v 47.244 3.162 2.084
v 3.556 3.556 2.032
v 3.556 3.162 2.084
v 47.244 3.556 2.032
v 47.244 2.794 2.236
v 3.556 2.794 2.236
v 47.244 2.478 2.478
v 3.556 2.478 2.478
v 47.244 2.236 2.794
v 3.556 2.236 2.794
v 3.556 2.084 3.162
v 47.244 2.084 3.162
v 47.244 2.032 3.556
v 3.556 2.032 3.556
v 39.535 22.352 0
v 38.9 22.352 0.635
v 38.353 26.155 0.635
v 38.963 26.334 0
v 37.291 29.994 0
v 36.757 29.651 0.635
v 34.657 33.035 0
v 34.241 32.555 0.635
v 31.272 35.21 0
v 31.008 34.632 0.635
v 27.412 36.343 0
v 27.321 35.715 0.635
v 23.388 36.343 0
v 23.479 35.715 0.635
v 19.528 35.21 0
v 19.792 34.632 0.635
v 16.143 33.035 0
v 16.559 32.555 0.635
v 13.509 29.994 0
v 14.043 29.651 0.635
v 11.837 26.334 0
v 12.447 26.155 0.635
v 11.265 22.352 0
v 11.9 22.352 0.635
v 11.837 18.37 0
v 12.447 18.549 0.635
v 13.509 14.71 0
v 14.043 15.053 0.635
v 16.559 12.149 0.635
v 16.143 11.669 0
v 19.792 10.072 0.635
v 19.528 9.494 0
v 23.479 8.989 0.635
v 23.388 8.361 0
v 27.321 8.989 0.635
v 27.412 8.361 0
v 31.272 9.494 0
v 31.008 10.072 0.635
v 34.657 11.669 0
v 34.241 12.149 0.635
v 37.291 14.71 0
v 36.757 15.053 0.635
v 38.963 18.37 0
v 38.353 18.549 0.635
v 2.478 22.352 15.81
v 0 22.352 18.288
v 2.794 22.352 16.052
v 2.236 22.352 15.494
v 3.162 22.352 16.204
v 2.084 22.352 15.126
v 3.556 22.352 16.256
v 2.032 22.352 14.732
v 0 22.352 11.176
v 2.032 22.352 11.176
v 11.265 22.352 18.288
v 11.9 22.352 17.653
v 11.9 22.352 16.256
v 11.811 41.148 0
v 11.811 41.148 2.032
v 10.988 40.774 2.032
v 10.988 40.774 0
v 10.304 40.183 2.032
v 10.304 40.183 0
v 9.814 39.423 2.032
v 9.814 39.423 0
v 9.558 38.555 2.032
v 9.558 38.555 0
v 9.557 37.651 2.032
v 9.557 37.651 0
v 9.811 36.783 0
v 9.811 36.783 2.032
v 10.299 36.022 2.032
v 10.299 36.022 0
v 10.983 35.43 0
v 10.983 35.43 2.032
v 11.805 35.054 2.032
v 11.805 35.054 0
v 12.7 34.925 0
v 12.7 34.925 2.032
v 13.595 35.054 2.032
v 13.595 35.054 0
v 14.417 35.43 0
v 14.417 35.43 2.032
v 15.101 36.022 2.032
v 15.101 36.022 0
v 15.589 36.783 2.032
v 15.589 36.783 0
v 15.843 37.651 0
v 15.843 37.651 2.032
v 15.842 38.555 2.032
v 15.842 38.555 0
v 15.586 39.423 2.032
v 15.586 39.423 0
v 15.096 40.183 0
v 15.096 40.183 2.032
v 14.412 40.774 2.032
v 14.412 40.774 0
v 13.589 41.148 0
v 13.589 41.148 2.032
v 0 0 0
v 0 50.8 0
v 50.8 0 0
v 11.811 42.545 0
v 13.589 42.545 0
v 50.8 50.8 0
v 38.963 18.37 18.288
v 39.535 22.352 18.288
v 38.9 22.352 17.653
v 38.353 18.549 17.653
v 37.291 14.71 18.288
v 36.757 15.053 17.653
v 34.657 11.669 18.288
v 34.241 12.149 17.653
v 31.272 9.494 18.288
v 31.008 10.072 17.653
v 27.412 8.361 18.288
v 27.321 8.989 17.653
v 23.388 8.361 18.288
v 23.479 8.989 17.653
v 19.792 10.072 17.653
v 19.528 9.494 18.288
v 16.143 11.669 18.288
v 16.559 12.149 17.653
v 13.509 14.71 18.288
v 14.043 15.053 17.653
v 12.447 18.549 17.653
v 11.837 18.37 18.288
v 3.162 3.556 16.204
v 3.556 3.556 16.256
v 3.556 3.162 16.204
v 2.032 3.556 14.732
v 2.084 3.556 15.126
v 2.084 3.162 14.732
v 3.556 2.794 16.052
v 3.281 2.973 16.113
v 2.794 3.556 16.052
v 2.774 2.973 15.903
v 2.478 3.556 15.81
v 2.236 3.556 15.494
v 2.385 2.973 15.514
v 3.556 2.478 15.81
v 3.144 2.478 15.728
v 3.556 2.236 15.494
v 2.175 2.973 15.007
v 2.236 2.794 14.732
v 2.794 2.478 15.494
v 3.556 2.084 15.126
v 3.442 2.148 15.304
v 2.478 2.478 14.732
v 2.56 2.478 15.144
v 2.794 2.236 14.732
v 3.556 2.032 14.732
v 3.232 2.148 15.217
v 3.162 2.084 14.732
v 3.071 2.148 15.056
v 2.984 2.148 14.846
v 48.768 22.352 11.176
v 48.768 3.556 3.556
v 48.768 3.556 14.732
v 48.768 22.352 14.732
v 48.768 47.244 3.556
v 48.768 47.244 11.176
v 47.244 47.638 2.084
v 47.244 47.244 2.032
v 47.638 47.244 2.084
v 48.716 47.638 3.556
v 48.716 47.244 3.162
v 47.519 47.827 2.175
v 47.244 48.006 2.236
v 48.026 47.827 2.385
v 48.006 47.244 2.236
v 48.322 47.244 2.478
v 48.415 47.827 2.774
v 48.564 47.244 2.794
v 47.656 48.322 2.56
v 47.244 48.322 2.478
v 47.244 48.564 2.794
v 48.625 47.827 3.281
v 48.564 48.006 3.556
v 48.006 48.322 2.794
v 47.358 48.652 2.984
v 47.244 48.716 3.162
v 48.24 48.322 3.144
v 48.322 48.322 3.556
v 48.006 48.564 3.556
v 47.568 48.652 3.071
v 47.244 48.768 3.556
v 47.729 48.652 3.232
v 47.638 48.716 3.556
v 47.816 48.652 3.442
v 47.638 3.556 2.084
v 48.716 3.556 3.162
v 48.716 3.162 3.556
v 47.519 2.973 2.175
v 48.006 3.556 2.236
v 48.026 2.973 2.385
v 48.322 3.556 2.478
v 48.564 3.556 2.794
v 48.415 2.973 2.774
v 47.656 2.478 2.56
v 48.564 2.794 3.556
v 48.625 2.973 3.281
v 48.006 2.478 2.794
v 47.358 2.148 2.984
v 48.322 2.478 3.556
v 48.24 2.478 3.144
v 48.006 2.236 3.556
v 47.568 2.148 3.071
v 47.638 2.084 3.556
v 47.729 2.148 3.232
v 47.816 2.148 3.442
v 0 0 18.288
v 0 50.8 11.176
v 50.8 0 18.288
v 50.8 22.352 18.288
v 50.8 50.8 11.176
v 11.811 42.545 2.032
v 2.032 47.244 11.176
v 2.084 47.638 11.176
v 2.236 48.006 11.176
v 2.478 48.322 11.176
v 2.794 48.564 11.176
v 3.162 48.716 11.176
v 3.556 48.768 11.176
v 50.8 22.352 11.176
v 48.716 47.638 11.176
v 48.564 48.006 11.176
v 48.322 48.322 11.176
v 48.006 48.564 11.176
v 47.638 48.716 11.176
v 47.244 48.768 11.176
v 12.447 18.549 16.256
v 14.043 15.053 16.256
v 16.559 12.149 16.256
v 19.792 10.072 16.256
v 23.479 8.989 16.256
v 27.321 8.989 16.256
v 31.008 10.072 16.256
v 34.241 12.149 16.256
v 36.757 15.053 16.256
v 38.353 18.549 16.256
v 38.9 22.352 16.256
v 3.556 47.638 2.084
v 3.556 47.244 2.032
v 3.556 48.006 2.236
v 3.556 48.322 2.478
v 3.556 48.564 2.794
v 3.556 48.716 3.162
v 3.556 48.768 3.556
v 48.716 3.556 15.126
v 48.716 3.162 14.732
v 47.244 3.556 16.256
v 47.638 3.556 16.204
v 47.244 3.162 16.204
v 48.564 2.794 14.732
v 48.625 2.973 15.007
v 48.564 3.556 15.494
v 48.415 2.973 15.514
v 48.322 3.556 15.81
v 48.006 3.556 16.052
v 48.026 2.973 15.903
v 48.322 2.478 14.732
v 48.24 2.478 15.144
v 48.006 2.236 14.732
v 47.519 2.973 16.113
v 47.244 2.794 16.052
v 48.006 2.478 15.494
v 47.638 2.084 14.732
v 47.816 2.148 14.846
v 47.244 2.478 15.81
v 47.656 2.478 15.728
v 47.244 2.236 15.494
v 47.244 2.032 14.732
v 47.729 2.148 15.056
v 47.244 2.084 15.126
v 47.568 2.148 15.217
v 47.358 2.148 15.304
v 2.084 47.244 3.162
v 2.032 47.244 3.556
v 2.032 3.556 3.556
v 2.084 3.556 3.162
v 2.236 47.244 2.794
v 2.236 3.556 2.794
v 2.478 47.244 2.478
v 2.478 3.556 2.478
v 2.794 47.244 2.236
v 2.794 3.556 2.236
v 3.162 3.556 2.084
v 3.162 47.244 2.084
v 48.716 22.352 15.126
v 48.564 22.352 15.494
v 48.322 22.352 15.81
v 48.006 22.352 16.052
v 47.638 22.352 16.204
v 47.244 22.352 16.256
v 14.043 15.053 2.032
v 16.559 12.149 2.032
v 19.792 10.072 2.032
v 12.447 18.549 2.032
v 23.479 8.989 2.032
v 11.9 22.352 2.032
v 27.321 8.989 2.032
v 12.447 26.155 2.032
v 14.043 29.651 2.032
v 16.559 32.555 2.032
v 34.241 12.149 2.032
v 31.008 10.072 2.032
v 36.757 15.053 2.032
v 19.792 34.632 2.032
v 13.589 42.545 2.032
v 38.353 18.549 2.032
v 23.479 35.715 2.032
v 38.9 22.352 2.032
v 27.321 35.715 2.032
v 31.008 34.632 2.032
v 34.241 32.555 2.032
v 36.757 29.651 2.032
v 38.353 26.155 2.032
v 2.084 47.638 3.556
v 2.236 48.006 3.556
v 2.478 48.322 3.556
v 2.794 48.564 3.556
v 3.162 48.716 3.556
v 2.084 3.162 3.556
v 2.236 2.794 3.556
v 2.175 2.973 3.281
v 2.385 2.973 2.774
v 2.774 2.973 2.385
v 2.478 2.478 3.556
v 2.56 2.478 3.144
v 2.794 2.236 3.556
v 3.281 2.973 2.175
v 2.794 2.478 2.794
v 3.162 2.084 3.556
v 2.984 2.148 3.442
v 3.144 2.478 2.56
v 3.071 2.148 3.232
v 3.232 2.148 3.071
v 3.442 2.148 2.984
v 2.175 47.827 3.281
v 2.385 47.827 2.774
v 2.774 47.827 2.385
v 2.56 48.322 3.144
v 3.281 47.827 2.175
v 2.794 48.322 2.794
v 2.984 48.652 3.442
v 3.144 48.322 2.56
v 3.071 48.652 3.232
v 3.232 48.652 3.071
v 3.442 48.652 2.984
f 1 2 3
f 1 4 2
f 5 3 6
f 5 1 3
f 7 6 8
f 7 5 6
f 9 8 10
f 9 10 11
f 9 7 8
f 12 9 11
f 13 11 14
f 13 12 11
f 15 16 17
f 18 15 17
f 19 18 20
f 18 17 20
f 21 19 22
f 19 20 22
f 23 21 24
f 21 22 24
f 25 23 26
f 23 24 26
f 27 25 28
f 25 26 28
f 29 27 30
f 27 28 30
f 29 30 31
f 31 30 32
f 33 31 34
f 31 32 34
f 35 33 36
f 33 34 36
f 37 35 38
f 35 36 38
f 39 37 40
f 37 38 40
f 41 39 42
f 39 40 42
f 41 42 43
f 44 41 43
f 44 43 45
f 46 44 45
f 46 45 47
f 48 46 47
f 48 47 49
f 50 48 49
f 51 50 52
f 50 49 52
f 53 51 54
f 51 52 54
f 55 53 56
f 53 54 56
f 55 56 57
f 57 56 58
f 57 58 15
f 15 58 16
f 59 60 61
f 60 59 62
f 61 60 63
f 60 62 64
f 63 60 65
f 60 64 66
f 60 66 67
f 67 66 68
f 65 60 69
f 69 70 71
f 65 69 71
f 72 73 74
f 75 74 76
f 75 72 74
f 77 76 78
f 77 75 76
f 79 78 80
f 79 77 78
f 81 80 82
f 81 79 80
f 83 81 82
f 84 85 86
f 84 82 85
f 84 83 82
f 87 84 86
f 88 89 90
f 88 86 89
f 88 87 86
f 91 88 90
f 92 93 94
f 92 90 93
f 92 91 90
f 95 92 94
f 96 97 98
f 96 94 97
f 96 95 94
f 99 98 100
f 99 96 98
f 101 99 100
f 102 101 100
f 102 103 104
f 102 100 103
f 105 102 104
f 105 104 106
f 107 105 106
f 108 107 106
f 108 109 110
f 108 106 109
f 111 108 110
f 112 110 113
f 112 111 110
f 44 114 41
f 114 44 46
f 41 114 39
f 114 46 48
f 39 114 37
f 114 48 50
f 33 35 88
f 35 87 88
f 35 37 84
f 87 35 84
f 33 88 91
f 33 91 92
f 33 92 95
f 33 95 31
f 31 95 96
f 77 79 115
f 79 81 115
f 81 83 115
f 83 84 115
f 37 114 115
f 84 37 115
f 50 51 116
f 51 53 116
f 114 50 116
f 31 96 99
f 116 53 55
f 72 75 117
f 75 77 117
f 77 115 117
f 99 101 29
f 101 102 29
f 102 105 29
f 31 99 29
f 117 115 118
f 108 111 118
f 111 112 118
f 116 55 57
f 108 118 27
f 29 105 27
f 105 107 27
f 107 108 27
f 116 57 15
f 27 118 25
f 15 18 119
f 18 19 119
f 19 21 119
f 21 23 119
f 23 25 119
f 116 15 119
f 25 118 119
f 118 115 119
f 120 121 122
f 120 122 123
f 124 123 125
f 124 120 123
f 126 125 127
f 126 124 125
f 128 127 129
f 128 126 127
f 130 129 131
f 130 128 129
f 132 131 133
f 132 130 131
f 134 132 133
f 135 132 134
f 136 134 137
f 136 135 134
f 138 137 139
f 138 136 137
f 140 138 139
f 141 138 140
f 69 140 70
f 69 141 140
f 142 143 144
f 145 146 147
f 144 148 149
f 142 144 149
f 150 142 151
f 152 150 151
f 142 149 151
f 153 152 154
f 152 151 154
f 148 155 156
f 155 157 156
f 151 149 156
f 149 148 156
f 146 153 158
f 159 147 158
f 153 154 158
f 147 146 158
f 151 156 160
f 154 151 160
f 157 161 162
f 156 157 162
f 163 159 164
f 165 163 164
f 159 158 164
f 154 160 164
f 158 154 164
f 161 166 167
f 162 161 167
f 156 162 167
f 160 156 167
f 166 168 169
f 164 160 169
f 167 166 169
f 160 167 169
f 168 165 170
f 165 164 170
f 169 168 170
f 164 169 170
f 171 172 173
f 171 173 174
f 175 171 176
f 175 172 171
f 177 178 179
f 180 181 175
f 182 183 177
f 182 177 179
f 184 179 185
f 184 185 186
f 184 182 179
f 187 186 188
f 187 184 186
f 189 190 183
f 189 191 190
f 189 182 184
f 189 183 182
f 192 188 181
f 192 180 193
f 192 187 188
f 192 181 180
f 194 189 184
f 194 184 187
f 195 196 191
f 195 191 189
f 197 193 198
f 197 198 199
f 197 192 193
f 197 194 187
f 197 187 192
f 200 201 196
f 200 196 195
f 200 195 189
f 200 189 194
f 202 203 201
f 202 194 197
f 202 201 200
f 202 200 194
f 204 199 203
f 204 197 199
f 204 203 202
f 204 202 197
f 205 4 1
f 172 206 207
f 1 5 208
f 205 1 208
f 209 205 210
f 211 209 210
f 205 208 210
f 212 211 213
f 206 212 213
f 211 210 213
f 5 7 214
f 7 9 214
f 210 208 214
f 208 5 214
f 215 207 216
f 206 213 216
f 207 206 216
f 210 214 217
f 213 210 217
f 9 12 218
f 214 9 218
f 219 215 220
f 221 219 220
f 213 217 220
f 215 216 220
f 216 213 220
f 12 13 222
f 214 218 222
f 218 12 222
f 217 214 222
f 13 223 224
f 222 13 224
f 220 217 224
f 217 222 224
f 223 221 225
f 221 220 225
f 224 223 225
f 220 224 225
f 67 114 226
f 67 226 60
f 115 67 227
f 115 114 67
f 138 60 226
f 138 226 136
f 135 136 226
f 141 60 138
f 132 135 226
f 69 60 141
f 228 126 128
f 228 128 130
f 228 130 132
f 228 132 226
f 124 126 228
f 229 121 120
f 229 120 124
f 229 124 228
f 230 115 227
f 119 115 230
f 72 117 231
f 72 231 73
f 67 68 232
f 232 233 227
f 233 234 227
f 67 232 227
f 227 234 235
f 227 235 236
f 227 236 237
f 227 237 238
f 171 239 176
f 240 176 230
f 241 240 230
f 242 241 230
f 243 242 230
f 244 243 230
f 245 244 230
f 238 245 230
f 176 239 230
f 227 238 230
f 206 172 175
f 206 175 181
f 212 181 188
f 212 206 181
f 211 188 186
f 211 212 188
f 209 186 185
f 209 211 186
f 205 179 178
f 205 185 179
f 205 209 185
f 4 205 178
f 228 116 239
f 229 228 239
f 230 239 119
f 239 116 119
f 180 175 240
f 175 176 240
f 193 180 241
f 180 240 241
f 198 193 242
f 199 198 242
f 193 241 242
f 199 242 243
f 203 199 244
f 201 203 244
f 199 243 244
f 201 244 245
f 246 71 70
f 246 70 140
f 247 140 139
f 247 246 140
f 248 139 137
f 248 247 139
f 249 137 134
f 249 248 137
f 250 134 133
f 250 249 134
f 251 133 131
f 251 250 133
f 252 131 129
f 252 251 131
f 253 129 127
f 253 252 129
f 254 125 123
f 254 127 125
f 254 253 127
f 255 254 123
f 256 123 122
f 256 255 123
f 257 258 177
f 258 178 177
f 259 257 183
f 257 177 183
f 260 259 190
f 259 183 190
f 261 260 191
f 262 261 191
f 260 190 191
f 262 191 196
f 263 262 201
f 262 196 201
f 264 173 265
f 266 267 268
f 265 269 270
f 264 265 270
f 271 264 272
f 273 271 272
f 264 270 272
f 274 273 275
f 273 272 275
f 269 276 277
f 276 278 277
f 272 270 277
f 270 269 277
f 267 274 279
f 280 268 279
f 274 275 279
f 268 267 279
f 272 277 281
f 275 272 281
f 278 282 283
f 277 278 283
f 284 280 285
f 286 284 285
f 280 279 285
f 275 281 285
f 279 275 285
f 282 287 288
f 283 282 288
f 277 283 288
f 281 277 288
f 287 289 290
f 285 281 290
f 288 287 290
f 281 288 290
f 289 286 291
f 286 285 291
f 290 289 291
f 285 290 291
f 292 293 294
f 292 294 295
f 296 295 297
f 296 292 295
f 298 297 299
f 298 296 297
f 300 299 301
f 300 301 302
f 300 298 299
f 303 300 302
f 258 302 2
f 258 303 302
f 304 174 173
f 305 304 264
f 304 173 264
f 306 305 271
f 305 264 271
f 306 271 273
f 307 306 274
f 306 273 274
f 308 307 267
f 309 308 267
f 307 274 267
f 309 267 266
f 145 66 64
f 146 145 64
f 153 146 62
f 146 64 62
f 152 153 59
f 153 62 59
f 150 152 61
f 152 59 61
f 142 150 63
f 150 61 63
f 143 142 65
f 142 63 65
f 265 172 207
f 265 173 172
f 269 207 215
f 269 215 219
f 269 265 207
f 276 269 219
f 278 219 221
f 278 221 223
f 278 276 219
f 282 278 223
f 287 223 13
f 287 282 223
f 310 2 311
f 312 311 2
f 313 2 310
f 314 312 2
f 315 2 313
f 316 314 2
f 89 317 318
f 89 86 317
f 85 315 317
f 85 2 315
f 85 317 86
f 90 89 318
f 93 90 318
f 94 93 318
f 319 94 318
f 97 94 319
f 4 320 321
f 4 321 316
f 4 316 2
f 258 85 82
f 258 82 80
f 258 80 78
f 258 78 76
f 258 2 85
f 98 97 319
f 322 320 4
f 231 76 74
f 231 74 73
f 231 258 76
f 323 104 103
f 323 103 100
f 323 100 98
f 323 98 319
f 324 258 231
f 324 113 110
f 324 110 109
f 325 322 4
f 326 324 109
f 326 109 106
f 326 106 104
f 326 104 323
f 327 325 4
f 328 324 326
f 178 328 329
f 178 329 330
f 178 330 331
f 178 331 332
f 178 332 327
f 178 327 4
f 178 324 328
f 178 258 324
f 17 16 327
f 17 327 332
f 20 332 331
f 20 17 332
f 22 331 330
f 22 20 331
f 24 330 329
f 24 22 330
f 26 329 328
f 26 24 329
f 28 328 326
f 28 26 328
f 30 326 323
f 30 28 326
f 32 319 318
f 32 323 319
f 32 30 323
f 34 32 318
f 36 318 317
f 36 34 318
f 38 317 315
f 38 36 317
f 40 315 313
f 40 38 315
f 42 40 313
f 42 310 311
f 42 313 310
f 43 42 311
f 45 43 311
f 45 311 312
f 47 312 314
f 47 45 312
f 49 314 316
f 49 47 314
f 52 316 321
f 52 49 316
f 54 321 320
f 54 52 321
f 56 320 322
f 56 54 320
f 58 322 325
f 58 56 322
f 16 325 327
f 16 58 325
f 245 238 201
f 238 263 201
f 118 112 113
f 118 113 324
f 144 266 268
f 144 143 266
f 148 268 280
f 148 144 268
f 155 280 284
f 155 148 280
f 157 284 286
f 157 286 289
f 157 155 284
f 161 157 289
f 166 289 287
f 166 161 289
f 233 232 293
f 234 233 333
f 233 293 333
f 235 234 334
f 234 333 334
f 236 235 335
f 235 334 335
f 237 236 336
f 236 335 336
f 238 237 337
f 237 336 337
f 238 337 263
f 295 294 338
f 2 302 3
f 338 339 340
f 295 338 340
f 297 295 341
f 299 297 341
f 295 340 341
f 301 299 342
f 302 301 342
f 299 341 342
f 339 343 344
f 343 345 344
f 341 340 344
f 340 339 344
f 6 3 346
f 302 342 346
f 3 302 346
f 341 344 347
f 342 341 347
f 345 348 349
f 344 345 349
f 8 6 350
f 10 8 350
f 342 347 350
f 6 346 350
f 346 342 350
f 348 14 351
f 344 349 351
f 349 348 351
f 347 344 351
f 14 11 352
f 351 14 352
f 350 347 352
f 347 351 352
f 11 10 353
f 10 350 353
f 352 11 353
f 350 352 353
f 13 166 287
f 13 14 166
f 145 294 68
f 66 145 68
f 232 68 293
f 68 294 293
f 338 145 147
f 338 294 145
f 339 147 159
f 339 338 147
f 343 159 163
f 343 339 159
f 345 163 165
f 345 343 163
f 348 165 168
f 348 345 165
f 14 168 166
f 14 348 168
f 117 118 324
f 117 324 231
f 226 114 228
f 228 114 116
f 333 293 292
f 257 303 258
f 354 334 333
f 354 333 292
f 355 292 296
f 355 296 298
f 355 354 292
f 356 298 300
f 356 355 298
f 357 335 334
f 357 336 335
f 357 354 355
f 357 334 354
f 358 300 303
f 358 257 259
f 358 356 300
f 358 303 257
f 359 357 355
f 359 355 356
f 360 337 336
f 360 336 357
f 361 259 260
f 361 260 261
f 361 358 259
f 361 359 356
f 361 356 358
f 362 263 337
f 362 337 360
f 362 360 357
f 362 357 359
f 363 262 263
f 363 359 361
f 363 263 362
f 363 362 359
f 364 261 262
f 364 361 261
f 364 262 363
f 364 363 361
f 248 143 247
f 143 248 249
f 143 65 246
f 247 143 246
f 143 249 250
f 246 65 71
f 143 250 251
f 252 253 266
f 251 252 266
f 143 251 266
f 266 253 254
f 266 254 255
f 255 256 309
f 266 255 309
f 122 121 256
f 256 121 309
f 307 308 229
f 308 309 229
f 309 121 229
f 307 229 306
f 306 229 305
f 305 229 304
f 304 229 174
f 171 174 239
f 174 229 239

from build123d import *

# Parameters (mm, degrees)
SKETCH1_W          = 50.8
SKETCH1_H          = 50.8
MAIN_BODY_DEPTH    = 18.288
SKETCH2_W          = 7.112
SKETCH2_H          = 28.448
FRONT_CUT_DEPTH    = 75.133197314
SHELL1_T           = -2.032
SKETCH3_R          = 13.5001
CENTER_HOLE_DEPTH  = 75.133197314
FILL060_VERT_R     = 1.524
FILL060_TB_R       = 1.524
CHAM025_SIZE       = 0.635
KEYED_HOLE_1_DEPTH = 58.653742931


with BuildPart() as part:
    # Sketch1 → main body (new body)
    with BuildSketch(Plane.XY):
        with Locations((25.4, 25.4)):
            Rectangle(SKETCH1_W, SKETCH1_H)
    extrude(amount=MAIN_BODY_DEPTH)

    # Sketch2 → front cut (cut, through all)
    with BuildSketch(Plane(origin=(50.8, 0, 0), x_dir=(0, 0, -1), z_dir=(1, 0, 0))):
        with Locations((-14.732, 36.576)):
            Rectangle(SKETCH2_W, SKETCH2_H)
    extrude(amount=-FRONT_CUT_DEPTH, mode=Mode.SUBTRACT)

    # Shell1
    shell1_openings = [part.faces().sort_by_distance(p)[0] for p in [
        (25.4, 36.576, 11.176),
        (25.4, 22.352, 14.732),
    ]]
    offset(amount=SHELL1_T, openings=shell1_openings, kind=Kind.INTERSECTION)

    # Sketch3 → center hole (cut, through all)
    with BuildSketch(Plane.XY):
        with Locations((25.4, 22.352)):
            Circle(SKETCH3_R)
    extrude(amount=CENTER_HOLE_DEPTH, mode=Mode.SUBTRACT)

    # fill060.vert
    fill060_vert_edges = [part.edges().sort_by_distance(p)[0] for p in [
        (2.032, 12.192, 16.256),
        (48.768, 12.192, 16.256),
        (2.032, 25.4, 2.032),
        (48.768, 25.4, 2.032),
    ]]
    fillet(fill060_vert_edges, radius=FILL060_VERT_R)

    # fill060.tb
    fill060_tb_edges = [part.edges().sort_by_distance(p)[0] for p in [
        (2.032, 48.768, 7.366),
        (48.768, 48.768, 7.366),
        (25.4, 2.032, 16.256),
        (25.4, 2.032, 2.032),
        (2.032, 2.032, 9.144),
        (48.768, 2.032, 9.144),
        (2.478369265, 2.032, 15.809630735),
        (2.478369265, 2.032, 2.478369265),
        (48.321630735, 2.032, 2.478369265),
        (48.321630735, 2.032, 15.809630735),
        (25.4, 48.768, 2.032),
        (2.478369265, 48.768, 2.478369265),
        (48.321630735, 48.768, 2.478369265),
    ]]
    fillet(fill060_tb_edges, radius=FILL060_TB_R)

    # cham025
    cham025_edges = [part.edges().sort_by_distance(p)[0] for p in [
        (11.8999, 22.352, 0),
        (25.4, 8.8519, 18.288),
    ]]
    chamfer(cham025_edges, length=CHAM025_SIZE)

    # Sketch6 → Keyed Hole 1 (cut, through all)
    with BuildSketch(Plane(origin=(13.426773448, 39.909210303, 0), x_dir=(0, 1, 0), z_dir=(0, 0, -1))):
        with BuildLine():
            Line((1.238789697, 0.162226552), (2.635789697, 0.162226552))
            Line((2.635789697, 0.162226552), (2.635789697, -1.615773448))
            Line((2.635789697, -1.615773448), (1.238789697, -1.615773448))
            ThreePointArc((1.238789697, -1.615773448), (-4.984210303, -0.726773448), (1.238789697, 0.162226552))
        make_face()
    extrude(amount=-KEYED_HOLE_1_DEPTH, mode=Mode.SUBTRACT)


solid = part.part
